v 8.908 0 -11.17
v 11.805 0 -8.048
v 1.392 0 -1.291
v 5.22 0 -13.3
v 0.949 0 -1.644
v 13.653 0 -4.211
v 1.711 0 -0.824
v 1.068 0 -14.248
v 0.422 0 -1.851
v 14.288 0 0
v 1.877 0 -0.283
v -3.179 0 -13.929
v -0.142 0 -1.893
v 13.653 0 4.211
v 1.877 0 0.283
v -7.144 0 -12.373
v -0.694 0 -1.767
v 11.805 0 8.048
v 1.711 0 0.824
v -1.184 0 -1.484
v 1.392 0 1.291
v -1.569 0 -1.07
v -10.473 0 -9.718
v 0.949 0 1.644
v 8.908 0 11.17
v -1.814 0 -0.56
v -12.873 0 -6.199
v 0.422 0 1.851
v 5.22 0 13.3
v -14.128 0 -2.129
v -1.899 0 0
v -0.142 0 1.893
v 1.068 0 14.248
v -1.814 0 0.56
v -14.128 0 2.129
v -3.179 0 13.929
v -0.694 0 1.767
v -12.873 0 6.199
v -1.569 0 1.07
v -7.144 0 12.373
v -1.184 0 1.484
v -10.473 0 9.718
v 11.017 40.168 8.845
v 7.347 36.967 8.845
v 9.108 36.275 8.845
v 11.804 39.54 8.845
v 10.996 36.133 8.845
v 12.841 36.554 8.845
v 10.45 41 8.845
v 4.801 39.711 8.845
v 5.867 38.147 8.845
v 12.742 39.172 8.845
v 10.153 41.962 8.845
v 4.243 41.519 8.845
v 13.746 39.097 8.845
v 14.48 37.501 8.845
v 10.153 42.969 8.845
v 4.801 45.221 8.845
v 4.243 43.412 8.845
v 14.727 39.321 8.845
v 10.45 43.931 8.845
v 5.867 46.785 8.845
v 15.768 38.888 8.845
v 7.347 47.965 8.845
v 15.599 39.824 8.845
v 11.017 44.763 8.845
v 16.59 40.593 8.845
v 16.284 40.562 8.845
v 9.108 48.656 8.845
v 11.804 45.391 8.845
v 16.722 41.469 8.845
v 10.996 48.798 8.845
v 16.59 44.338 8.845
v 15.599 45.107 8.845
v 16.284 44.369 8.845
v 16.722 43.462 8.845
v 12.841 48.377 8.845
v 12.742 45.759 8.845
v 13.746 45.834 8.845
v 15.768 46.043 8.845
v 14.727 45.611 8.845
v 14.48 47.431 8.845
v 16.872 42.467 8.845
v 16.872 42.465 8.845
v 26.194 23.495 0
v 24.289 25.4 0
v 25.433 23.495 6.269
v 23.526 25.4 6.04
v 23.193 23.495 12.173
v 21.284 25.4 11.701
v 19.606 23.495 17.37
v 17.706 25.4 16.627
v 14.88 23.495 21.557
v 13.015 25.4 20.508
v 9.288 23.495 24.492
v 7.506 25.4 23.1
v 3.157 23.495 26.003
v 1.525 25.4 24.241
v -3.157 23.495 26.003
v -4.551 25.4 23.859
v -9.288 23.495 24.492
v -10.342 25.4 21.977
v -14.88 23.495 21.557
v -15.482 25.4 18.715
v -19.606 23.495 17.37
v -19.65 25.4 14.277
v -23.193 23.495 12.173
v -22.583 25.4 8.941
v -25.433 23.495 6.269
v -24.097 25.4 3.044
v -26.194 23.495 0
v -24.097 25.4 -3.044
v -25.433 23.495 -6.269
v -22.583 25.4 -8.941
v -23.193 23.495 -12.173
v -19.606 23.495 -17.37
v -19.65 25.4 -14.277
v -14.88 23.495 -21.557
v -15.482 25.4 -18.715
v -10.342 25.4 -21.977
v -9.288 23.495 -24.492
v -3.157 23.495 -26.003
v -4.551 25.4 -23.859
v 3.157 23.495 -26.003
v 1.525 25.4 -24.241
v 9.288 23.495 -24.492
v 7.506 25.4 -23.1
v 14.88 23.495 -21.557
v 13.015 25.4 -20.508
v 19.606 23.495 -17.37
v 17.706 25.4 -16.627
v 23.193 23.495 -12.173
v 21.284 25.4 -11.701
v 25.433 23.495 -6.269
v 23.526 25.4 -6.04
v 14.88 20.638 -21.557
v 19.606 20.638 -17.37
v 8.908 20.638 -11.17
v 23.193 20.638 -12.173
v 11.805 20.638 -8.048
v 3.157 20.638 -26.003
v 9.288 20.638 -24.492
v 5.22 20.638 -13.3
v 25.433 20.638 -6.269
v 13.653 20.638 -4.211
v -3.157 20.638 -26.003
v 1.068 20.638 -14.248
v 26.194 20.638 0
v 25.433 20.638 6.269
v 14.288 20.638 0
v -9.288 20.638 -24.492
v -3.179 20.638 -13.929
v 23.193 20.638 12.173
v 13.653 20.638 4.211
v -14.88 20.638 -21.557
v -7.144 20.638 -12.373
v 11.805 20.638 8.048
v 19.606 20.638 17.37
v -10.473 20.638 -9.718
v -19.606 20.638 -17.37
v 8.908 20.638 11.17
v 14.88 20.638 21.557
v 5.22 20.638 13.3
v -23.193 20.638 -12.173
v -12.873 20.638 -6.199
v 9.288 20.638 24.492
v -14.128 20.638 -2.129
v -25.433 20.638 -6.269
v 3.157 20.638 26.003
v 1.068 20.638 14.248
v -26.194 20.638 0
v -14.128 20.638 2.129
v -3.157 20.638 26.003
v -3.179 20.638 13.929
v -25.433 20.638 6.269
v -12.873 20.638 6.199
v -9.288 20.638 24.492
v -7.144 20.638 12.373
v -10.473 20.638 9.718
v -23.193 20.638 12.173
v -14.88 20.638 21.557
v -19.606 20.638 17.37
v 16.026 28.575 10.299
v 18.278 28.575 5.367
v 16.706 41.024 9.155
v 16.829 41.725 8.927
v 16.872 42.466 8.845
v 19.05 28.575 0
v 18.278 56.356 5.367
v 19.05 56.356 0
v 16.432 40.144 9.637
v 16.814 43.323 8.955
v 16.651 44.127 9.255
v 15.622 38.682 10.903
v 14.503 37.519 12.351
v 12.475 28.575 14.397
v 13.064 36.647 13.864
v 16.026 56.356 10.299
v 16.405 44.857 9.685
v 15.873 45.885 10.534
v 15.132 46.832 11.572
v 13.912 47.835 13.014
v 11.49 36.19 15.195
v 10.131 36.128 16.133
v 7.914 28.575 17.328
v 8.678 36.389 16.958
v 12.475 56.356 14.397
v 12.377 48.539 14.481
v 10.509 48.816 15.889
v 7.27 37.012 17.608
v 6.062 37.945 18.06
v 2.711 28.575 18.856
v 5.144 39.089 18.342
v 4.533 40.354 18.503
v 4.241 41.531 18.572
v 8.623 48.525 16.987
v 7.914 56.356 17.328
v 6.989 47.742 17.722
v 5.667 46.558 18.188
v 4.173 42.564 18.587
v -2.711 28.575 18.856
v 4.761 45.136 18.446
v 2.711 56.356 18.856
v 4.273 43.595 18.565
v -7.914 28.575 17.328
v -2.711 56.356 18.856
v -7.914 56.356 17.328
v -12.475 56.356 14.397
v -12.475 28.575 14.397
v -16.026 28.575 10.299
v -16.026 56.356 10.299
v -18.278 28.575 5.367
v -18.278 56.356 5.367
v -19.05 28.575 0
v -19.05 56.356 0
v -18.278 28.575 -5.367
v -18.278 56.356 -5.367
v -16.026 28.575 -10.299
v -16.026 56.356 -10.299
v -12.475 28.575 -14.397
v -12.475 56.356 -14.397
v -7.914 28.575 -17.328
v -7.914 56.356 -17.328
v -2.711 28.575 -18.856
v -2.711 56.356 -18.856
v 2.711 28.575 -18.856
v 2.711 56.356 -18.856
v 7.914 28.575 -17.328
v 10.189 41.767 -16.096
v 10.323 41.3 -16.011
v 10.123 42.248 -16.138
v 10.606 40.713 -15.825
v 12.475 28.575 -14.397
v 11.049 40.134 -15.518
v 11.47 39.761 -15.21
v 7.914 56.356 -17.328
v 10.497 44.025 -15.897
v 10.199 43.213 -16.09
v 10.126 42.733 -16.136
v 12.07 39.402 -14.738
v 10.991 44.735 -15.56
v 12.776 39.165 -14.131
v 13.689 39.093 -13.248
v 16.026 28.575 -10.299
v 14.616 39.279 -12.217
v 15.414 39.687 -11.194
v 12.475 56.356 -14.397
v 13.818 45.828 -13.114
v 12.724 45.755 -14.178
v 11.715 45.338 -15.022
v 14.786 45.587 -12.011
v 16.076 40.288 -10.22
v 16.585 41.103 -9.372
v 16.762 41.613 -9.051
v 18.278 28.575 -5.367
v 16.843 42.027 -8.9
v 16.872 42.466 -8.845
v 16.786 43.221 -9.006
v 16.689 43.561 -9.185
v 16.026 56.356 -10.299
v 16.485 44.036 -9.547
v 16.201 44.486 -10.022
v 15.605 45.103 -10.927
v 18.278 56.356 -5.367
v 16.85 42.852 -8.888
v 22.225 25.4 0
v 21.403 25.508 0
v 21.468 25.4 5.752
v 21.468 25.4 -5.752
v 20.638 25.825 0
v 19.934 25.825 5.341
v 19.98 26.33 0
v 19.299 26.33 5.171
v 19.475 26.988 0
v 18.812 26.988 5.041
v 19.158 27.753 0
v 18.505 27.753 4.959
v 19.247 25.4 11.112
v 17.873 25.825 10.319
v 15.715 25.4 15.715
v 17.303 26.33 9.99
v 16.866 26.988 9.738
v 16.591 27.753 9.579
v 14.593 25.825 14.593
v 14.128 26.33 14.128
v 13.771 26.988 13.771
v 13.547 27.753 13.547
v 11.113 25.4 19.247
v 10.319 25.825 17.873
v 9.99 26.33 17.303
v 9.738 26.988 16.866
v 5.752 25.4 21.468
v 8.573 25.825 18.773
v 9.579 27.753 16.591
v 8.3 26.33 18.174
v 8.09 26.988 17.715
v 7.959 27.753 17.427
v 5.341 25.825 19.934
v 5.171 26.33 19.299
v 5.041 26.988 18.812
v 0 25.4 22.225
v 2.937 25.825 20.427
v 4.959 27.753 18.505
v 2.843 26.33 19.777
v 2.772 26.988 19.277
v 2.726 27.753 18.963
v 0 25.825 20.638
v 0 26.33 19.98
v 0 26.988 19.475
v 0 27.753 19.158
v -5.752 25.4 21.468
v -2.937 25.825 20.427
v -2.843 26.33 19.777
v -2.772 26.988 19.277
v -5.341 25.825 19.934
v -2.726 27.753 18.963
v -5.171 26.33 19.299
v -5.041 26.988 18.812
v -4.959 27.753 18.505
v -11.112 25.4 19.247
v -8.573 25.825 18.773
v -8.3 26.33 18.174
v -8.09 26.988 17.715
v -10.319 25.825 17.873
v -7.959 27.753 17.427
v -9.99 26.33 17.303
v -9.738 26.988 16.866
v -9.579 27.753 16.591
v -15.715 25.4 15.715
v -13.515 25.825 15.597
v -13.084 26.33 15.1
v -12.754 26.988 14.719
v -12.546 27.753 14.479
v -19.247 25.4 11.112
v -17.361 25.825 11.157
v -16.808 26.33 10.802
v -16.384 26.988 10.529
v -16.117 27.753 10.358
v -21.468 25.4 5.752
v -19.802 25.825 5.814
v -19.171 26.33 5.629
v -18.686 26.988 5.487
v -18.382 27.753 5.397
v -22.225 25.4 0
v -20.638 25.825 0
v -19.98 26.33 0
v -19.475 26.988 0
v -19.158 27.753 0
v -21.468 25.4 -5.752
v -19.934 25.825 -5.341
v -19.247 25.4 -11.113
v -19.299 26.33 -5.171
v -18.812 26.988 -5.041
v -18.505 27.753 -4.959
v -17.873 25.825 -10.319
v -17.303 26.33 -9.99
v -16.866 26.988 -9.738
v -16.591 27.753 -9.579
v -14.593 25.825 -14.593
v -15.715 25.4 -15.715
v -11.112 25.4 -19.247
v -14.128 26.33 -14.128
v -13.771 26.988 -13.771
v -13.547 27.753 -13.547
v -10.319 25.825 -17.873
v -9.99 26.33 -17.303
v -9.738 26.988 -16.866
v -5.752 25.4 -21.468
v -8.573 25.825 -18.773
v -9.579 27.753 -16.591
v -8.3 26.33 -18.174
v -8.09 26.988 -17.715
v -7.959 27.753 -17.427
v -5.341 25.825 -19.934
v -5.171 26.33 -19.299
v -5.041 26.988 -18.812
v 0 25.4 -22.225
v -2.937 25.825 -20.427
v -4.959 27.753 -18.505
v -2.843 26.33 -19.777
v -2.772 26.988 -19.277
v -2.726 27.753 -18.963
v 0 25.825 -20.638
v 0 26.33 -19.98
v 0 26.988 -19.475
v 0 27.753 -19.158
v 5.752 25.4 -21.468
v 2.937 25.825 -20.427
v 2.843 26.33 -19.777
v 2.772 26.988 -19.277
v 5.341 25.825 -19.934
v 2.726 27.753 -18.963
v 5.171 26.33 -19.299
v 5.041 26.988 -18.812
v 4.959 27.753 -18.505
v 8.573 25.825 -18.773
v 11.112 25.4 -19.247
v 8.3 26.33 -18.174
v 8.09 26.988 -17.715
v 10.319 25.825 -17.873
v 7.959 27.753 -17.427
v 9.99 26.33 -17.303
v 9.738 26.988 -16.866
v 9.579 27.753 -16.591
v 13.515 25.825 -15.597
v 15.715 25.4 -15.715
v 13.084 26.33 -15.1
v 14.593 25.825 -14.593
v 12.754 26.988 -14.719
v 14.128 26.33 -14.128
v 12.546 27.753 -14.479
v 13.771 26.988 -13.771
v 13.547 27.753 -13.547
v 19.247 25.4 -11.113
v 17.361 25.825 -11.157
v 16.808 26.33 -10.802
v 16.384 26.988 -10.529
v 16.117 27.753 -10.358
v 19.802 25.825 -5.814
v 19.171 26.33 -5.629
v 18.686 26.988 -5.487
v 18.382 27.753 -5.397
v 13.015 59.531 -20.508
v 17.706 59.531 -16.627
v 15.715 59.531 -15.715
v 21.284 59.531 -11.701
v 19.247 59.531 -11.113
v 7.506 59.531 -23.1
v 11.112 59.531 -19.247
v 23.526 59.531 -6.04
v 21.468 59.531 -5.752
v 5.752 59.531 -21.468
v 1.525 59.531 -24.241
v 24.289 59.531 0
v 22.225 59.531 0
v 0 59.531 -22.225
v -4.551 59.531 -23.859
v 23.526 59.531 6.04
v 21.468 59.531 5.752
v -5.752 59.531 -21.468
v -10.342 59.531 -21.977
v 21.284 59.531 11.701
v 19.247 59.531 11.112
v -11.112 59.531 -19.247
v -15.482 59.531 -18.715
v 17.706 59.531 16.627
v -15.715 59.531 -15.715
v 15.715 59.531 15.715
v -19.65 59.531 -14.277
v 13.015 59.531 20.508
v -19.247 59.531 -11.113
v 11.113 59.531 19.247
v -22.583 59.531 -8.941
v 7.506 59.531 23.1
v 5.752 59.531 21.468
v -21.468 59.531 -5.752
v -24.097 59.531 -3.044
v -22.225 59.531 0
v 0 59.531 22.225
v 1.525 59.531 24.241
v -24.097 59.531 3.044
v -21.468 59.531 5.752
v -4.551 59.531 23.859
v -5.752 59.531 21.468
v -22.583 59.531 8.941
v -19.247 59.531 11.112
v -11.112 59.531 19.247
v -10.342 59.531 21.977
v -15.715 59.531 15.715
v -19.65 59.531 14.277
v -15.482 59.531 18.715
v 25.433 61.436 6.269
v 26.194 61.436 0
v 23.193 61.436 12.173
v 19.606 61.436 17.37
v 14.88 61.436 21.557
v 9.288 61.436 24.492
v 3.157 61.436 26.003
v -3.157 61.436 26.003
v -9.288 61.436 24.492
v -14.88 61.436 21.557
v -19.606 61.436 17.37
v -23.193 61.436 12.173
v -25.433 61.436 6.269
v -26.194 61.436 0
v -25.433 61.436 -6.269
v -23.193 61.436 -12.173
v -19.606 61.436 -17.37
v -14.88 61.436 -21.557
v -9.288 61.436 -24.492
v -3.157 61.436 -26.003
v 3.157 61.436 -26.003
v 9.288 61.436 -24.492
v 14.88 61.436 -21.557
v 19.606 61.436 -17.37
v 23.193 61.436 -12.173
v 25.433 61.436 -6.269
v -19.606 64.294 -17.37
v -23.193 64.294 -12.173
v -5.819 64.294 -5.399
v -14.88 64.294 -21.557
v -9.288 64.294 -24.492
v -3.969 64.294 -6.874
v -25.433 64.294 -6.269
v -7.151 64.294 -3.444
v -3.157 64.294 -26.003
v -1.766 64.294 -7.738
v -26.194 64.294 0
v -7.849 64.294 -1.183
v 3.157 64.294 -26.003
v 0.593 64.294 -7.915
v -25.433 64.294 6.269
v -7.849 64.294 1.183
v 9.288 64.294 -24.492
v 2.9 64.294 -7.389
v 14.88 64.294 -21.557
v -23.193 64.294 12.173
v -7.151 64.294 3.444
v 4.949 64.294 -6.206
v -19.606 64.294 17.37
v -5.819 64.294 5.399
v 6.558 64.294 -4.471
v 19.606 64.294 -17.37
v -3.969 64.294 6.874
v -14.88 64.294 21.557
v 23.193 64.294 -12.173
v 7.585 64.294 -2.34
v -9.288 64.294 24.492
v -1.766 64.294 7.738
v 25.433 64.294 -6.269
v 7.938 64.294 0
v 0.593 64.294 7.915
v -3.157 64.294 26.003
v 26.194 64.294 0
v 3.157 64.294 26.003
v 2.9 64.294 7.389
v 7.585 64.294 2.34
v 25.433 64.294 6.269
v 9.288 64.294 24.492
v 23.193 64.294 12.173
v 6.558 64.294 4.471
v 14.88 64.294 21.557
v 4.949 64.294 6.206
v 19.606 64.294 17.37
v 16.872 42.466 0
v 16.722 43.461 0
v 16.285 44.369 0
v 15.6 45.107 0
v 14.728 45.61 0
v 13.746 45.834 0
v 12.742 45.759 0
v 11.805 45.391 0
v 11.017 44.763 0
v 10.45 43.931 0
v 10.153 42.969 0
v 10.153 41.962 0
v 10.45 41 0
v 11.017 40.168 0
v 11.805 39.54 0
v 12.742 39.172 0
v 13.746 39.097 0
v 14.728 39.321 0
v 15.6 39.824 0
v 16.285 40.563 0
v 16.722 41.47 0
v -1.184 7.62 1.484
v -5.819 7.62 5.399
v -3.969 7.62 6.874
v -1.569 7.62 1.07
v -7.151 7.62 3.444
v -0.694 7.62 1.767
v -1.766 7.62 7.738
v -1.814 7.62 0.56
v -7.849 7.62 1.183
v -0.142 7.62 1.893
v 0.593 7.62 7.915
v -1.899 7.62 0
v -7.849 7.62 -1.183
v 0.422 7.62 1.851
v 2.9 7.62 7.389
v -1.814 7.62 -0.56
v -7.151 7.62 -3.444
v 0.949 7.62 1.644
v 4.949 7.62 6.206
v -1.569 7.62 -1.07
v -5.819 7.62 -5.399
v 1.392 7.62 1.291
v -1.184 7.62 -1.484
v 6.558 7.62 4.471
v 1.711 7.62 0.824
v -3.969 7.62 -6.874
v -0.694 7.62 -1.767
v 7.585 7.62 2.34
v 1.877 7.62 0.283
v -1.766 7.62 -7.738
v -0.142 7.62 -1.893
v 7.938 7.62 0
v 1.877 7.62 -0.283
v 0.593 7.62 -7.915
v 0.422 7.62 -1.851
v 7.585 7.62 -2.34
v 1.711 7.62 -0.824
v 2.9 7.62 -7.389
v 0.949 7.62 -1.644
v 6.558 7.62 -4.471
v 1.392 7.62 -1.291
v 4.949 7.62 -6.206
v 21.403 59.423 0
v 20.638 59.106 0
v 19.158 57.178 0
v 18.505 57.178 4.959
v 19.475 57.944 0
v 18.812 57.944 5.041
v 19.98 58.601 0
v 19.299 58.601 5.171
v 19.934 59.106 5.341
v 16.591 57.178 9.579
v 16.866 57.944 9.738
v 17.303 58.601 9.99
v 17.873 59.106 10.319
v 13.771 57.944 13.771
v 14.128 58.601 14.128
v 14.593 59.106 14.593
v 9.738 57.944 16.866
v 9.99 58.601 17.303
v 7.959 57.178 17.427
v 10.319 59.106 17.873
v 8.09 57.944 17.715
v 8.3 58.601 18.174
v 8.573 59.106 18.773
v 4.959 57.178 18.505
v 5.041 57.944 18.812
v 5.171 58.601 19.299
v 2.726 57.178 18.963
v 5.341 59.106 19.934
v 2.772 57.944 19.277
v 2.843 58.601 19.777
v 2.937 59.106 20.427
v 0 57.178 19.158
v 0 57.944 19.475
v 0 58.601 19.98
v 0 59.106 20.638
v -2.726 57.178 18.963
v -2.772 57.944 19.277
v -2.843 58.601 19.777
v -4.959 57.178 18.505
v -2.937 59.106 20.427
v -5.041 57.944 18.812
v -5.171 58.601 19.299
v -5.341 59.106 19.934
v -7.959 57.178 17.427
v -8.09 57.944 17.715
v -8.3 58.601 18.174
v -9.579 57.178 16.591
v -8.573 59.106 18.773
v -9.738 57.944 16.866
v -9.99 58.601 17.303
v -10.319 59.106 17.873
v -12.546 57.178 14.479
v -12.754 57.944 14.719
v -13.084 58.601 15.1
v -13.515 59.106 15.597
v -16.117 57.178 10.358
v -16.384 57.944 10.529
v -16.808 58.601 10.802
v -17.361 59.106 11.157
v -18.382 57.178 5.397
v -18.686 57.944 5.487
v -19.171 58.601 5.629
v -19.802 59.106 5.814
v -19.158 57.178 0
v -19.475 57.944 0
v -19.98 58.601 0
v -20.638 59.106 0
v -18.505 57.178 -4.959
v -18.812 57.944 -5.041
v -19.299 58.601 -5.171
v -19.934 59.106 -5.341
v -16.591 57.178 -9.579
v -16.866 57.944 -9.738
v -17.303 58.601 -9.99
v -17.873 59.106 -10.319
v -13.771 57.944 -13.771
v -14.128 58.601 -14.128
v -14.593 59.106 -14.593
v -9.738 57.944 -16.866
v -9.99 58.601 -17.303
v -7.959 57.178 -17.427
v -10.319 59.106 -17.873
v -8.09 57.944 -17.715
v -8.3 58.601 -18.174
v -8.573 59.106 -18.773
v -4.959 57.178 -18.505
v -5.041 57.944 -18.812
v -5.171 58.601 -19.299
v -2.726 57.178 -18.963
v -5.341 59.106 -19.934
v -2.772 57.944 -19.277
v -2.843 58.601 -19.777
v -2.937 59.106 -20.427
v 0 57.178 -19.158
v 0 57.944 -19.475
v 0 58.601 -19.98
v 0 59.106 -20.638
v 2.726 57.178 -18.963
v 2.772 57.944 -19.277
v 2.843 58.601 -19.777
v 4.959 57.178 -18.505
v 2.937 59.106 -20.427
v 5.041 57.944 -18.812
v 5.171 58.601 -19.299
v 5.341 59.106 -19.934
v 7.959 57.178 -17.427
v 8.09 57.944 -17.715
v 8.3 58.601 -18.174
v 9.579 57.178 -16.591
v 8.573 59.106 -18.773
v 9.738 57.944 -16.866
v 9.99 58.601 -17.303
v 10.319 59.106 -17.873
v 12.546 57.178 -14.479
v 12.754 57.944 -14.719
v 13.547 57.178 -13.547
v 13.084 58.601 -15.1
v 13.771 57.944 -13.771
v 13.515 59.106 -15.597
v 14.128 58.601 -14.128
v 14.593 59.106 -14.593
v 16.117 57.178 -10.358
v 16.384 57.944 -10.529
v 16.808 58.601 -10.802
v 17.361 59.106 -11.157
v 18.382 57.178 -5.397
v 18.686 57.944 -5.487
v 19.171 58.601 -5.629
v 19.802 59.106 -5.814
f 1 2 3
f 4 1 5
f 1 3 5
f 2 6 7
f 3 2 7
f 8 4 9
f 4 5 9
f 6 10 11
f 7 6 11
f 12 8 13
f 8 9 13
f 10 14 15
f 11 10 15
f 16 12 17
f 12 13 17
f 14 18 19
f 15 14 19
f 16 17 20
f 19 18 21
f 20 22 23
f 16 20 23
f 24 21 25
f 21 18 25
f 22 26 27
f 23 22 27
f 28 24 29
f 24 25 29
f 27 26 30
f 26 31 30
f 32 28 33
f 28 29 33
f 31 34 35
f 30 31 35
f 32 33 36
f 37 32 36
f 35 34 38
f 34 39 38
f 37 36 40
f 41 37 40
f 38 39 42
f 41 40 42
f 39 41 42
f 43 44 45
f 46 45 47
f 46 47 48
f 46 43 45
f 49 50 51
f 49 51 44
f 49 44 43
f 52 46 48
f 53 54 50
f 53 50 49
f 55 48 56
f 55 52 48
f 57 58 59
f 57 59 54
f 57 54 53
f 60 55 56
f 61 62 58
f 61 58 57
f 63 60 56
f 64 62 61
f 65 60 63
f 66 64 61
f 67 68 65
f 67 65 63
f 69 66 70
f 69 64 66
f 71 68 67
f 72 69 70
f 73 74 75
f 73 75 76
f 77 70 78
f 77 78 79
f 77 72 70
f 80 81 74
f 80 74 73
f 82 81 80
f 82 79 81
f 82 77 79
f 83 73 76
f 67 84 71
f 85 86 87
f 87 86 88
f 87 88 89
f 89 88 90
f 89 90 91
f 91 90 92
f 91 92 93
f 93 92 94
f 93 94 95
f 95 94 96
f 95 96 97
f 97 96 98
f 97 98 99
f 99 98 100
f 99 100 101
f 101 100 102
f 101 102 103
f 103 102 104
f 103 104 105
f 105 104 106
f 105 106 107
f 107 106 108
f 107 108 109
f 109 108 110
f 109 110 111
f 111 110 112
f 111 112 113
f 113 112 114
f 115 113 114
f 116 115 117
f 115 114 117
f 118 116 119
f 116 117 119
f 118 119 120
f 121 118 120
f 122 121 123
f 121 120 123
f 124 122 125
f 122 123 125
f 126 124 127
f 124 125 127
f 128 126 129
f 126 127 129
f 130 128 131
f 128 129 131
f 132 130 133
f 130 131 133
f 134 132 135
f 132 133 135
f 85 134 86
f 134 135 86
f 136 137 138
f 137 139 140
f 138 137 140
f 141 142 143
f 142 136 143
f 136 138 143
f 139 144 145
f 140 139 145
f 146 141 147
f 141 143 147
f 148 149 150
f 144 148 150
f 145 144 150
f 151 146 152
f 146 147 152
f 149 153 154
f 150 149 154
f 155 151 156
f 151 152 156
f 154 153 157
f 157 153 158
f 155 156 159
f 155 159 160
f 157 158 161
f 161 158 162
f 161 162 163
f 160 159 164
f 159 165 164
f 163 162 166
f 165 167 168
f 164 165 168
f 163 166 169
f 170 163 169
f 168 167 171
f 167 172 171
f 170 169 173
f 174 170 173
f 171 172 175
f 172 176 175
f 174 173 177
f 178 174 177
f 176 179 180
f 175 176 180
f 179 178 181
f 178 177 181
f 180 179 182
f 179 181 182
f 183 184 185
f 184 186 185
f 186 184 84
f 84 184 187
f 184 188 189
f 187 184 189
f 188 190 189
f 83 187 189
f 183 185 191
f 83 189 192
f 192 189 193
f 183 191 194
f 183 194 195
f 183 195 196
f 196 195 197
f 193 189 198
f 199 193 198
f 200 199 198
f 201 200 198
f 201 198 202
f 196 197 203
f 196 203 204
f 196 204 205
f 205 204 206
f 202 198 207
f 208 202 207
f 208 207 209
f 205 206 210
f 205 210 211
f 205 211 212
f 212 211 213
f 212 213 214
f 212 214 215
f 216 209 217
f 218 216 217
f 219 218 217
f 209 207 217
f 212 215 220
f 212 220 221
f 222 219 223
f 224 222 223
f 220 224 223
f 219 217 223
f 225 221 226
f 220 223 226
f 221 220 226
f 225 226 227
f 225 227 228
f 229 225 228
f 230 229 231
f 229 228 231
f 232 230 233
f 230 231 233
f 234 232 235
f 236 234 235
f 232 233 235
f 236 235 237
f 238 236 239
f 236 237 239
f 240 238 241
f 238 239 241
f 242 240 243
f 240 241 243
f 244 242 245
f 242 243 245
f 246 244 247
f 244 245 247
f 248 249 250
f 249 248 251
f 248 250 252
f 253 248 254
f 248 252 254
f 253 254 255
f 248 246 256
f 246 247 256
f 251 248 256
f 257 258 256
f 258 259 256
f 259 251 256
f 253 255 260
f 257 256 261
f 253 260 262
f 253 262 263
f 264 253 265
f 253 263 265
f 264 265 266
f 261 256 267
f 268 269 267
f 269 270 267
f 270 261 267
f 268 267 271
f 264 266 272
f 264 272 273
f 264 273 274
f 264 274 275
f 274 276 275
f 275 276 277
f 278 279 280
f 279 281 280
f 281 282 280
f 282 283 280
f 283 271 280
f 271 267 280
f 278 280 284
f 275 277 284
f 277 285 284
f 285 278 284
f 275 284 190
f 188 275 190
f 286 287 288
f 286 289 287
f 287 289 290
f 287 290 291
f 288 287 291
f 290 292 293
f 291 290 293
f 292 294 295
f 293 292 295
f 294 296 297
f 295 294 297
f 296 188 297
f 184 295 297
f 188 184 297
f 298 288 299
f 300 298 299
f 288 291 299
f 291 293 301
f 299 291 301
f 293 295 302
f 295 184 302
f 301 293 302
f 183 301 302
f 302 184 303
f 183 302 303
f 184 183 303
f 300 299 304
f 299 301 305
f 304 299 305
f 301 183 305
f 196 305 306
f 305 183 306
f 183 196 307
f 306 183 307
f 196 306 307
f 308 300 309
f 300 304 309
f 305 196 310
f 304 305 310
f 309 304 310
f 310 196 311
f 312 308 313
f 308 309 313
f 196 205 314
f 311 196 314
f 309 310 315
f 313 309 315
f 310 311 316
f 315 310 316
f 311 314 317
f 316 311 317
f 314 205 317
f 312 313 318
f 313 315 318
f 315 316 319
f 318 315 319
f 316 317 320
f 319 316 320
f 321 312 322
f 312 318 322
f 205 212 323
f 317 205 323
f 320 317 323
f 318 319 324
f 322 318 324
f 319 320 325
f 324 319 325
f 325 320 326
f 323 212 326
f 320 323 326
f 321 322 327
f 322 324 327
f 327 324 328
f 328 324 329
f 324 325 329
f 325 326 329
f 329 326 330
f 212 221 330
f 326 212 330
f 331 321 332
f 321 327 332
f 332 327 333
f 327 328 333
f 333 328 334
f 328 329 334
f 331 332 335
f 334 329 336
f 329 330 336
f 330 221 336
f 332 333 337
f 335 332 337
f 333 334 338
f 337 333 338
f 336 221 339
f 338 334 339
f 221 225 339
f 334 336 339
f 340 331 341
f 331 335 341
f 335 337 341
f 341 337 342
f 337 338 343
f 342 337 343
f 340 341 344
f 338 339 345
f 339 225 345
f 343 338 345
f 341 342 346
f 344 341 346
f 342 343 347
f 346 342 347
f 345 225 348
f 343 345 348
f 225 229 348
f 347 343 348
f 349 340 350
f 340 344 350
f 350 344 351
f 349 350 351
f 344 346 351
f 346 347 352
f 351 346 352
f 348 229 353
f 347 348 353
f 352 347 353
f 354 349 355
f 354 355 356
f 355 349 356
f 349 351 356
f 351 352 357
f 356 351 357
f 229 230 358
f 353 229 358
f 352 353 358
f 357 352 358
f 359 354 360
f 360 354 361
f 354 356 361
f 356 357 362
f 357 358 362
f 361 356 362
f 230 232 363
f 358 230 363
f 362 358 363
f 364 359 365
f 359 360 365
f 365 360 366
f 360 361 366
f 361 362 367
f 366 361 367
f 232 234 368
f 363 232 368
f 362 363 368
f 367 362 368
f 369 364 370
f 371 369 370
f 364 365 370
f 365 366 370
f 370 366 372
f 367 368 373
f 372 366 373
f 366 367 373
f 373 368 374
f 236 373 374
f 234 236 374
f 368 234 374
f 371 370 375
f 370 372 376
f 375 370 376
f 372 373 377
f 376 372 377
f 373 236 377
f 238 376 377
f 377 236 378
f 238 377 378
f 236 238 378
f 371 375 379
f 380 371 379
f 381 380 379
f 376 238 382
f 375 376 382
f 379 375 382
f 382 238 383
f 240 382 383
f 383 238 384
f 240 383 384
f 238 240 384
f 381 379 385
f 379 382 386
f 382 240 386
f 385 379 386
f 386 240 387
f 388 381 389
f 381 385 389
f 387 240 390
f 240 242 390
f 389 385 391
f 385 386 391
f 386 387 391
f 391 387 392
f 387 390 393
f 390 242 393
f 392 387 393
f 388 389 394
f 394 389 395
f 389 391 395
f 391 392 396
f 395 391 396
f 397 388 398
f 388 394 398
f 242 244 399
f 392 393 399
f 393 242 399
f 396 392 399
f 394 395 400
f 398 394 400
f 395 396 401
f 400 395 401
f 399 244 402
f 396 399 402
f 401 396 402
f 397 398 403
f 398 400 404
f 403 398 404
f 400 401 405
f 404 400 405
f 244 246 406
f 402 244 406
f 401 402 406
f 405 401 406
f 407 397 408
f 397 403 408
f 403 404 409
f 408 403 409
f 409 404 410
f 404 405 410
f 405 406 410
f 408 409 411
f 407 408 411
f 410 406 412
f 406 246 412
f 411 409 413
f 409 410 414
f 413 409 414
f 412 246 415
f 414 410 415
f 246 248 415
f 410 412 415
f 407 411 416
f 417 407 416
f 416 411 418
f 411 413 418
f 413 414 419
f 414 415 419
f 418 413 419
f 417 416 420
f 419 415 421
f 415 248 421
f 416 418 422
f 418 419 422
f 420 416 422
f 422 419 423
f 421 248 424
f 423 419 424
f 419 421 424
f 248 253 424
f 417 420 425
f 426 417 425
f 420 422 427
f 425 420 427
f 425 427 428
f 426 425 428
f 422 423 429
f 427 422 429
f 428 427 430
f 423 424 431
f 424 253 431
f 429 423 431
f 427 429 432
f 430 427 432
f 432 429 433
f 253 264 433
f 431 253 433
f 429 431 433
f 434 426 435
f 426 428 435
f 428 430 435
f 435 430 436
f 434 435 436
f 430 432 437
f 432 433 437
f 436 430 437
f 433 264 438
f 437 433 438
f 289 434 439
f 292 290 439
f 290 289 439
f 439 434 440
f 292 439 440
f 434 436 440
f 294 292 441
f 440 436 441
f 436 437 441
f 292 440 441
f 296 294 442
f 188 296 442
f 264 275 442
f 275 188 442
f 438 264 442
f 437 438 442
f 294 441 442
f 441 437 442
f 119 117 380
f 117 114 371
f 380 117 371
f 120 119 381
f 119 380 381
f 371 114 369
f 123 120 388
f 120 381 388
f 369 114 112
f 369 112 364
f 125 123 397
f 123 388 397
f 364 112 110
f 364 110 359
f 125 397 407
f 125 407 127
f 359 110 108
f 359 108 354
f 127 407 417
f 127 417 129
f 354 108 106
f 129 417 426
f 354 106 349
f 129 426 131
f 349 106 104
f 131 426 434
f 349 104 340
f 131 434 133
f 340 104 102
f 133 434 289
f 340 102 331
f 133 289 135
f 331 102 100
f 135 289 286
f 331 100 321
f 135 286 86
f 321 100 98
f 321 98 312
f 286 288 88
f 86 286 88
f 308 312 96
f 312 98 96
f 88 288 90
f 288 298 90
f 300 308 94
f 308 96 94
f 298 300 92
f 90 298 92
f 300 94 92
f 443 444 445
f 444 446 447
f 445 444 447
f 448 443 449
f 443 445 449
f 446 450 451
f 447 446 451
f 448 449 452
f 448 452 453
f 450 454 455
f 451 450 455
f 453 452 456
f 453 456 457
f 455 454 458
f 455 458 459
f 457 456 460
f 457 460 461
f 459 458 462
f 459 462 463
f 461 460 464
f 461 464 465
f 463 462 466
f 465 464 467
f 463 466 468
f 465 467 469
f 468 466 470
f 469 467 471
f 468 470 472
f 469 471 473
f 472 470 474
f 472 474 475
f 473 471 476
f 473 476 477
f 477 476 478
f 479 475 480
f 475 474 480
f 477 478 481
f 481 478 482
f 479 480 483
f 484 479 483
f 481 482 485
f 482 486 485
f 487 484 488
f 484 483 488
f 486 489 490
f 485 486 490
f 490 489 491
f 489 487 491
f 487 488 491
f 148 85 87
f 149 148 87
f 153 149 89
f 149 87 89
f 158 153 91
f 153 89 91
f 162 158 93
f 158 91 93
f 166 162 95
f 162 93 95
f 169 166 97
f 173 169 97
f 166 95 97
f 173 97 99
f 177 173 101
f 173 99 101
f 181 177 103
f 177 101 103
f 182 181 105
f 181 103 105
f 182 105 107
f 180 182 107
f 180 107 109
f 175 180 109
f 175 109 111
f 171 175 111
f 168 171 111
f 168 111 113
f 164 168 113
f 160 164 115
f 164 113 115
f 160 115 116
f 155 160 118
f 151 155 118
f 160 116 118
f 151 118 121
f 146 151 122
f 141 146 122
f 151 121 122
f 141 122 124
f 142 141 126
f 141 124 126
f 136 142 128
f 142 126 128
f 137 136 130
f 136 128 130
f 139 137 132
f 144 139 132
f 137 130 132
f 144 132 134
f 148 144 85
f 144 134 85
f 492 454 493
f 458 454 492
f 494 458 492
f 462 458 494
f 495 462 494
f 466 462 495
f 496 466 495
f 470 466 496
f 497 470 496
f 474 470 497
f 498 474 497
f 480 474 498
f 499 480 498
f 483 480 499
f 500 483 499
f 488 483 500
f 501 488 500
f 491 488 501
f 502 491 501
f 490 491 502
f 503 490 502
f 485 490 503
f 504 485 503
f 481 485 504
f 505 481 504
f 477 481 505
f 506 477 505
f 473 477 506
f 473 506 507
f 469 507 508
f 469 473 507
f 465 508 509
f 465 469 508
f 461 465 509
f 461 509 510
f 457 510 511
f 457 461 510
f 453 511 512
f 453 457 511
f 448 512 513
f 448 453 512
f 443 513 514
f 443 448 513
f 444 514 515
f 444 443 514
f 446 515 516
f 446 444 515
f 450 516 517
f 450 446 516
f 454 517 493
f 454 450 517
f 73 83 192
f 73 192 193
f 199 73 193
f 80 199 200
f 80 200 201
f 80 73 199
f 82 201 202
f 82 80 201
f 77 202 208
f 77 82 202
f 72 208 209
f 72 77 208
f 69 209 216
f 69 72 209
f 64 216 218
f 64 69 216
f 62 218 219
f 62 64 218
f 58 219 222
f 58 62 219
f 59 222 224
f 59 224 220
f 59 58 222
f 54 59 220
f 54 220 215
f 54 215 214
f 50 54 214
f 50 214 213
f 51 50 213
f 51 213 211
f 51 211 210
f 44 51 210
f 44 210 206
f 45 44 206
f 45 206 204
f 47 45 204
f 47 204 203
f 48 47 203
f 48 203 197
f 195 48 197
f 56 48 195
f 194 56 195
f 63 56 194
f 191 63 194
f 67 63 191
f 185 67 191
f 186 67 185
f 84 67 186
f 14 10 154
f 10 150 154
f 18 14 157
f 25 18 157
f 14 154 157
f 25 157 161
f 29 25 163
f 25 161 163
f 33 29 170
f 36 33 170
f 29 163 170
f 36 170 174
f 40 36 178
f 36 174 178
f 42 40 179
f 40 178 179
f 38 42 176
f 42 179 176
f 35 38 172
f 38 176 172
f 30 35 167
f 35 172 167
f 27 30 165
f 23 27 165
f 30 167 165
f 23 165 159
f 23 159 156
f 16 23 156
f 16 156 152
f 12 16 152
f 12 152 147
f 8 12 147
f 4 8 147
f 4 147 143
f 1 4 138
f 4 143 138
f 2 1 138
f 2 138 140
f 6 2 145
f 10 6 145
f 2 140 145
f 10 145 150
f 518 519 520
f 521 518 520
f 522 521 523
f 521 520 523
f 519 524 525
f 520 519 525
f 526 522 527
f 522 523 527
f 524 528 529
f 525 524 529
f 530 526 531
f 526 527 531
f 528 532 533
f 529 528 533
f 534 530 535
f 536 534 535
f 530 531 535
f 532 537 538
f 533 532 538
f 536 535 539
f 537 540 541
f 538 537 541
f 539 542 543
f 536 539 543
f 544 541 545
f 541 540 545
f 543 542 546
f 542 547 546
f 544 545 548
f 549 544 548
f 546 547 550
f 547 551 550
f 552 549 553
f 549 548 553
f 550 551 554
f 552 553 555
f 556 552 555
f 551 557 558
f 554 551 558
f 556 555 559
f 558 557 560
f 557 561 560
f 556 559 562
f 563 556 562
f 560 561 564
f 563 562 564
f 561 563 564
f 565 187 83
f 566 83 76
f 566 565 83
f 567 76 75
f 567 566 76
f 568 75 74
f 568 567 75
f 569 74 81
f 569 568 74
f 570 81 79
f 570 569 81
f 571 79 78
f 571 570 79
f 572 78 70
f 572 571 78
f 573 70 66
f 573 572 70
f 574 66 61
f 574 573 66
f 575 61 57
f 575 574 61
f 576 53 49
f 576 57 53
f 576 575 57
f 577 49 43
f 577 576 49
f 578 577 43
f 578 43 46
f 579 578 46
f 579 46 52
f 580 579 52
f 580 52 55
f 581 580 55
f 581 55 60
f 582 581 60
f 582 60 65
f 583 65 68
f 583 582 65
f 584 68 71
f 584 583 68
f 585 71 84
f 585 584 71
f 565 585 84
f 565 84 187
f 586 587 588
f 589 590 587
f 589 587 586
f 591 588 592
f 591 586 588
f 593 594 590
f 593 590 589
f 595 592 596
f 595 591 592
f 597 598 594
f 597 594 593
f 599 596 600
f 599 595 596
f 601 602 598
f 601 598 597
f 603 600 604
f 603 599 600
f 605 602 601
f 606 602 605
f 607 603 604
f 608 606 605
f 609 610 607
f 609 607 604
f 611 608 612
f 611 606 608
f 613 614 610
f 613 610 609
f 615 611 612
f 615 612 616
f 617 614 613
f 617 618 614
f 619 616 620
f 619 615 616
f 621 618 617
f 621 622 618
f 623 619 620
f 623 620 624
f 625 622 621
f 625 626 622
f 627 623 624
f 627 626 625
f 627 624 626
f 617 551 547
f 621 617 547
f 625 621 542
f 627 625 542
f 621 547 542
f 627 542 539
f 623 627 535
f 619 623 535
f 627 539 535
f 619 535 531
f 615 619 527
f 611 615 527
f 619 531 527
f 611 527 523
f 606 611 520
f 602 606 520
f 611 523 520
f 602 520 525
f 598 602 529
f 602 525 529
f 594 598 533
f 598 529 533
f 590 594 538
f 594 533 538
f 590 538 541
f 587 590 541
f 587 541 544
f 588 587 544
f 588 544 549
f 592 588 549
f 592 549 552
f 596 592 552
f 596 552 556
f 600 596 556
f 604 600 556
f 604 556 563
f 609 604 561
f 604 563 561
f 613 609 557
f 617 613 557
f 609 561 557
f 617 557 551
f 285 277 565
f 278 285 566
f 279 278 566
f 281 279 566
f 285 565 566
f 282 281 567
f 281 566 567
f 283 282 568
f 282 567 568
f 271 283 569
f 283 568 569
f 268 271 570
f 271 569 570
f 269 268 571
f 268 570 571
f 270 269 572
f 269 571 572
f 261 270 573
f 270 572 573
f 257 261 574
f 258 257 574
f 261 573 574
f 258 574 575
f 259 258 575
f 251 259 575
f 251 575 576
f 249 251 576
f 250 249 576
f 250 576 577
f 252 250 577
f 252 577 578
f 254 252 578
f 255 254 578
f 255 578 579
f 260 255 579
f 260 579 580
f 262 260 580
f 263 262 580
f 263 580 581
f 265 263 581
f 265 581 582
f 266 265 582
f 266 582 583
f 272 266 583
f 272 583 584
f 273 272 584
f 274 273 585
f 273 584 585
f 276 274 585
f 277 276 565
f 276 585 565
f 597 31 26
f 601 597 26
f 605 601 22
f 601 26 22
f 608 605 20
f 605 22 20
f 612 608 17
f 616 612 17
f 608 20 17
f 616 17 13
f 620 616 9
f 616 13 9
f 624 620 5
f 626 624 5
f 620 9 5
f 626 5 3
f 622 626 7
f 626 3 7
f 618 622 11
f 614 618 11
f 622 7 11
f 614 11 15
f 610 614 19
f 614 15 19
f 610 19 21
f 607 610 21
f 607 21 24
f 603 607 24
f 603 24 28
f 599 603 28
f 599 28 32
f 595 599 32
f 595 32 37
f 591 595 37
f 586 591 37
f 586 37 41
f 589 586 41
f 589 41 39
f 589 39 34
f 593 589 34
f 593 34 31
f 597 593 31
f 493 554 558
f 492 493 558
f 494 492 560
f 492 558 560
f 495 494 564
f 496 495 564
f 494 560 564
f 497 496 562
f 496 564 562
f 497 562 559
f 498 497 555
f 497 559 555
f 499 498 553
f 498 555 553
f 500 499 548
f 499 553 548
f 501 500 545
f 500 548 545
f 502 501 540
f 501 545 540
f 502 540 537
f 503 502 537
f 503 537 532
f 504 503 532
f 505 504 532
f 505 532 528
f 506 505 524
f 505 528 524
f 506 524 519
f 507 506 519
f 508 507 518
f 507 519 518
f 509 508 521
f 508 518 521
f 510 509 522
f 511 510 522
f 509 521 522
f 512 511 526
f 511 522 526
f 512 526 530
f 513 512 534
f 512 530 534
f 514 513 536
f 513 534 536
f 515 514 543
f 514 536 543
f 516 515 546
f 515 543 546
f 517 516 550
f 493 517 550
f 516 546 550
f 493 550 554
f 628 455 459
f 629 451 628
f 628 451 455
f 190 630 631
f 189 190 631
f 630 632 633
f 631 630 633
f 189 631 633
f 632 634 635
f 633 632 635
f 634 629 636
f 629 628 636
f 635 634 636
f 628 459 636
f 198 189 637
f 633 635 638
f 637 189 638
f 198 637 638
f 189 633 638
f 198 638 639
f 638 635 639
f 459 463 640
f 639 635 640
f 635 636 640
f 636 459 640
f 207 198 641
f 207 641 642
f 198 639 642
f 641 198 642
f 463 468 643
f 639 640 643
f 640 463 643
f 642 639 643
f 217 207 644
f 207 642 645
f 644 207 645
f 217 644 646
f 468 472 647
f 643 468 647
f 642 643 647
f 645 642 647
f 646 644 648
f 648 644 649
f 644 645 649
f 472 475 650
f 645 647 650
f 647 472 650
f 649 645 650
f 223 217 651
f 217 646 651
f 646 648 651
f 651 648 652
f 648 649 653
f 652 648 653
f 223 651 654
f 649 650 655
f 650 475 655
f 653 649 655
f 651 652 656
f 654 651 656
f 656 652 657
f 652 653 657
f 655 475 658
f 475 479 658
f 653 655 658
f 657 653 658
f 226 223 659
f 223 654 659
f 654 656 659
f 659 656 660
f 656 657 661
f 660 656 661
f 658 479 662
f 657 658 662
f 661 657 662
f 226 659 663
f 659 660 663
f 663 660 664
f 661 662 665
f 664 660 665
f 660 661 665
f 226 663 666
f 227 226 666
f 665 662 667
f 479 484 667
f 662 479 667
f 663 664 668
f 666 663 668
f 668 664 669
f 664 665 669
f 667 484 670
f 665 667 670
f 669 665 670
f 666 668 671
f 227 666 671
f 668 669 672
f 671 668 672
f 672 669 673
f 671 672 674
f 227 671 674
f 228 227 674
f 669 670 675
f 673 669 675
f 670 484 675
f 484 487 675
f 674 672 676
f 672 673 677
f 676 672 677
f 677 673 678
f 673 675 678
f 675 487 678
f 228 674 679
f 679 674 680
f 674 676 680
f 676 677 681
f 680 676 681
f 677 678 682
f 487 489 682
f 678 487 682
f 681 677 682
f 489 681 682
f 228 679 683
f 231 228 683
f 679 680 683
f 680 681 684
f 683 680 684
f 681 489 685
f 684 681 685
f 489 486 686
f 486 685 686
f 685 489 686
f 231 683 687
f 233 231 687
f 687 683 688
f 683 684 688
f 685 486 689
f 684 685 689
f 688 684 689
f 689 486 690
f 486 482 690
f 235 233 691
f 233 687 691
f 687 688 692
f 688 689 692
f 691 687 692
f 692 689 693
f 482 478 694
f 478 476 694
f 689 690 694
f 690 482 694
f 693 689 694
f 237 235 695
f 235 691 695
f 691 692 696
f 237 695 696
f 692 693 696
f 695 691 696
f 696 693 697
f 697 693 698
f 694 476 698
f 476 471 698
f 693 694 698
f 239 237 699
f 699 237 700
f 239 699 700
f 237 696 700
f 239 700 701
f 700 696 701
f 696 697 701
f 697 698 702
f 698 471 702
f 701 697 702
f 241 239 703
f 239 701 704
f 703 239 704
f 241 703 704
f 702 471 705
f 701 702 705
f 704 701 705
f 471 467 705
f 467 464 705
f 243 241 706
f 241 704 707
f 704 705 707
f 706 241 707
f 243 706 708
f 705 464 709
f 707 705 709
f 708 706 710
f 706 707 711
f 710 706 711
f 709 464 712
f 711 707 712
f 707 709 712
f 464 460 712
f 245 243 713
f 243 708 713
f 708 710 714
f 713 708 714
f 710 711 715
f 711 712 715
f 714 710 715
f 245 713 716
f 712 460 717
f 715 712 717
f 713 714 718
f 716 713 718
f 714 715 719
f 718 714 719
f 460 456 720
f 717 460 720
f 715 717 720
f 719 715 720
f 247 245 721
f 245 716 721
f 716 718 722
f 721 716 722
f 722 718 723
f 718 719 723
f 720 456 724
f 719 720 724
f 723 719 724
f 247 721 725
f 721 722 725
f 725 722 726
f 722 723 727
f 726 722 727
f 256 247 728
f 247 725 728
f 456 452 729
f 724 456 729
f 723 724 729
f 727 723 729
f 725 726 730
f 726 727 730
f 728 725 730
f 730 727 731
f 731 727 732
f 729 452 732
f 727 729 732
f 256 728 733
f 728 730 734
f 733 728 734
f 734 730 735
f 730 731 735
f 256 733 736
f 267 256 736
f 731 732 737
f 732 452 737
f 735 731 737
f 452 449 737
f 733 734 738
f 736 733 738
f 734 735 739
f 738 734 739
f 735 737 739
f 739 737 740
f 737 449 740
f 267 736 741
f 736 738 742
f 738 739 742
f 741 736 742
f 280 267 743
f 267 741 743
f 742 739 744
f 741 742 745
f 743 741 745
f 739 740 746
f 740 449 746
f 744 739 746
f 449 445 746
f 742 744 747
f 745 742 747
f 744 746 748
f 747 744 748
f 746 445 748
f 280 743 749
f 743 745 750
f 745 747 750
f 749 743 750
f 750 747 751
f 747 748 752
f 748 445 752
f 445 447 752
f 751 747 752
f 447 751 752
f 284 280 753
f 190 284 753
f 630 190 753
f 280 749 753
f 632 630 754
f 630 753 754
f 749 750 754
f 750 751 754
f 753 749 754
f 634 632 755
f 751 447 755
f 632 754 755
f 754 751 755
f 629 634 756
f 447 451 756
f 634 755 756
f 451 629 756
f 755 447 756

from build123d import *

# Parameters (mm, degrees)
F_10_24_TAPPED_HOLE1_D  = 3.7973
CHAMFER1_SIZE           = 1.905
FILLET1_R               = 3.175
SKETCH5_R               = 7.9375
CUT_EXTRUDE2_DEPTH      = 56.67375
SKETCH6_R               = 3.3782
CUT_EXTRUDE3_DEPTH      = 27.19375
CUT_EXTRUDE3_DEPTH_BACK = 27.19375
CUT_EXTRUDE4_START      = 8.845327
SKETCH7_R               = 6.35
CUT_EXTRUDE4_DEPTH      = 18.348423


with BuildPart() as part:
    # Sketch1 → Revolve1 (revolve)
    with BuildSketch(Plane.XY):
        Polygon((0, 0), (14.2875, 0), (14.2875, 20.6375), (26.19375, 20.6375), (26.19375, 25.4), (19.05, 25.4), (19.05, 59.53125), (26.19375, 59.53125), (26.19375, 64.29375), (0, 64.29375), align=None)
    revolve(axis=Axis((0, 64.29375, 0), (0, -1, 0)))

    # #10-24 Tapped Hole1 (through all)
    with Locations(Plane(origin=(0, 64.29375, 0), x_dir=(1, 0, 0), z_dir=(0, 1, 0))):
        with Locations((0, 0)):
            Hole(F_10_24_TAPPED_HOLE1_D / 2)

    # Chamfer1
    chamfer1_edges = [part.edges().sort_by_distance(p)[0] for p in [
        (-26.19375, 59.53125, 0),
        (-26.19375, 25.4, 0),
    ]]
    chamfer(chamfer1_edges, length=CHAMFER1_SIZE)

    # Fillet1
    fillet1_edges = [part.edges().sort_by_distance(p)[0] for p in [
        (-19.05, 59.53125, 0),
        (-19.05, 25.4, 0),
    ]]
    fillet(fillet1_edges, radius=FILLET1_R)

    # Sketch5 → Cut-Extrude2 (cut)
    with BuildSketch(Plane(origin=(0, 64.29375, 0), x_dir=(1, 0, 0), z_dir=(0, 1, 0))):
        Circle(SKETCH5_R)
    extrude(amount=-CUT_EXTRUDE2_DEPTH, mode=Mode.SUBTRACT)

    # Sketch6 → Cut-Extrude3 (cut, two sides)
    with BuildSketch(Plane.XY) as cut_extrude3_sk:
        with Locations((13.49375, 42.465625)):
            Circle(SKETCH6_R)
    extrude(amount=CUT_EXTRUDE3_DEPTH, mode=Mode.SUBTRACT)
    extrude(cut_extrude3_sk.sketch, amount=-CUT_EXTRUDE3_DEPTH_BACK, mode=Mode.SUBTRACT)

    # Sketch7 → Cut-Extrude4 (cut, through all)
    with BuildSketch(Plane.XY.offset(CUT_EXTRUDE4_START)):
        with Locations((10.52195, 42.465625)):
            Circle(SKETCH7_R)
    extrude(amount=CUT_EXTRUDE4_DEPTH, mode=Mode.SUBTRACT)


solid = part.part
